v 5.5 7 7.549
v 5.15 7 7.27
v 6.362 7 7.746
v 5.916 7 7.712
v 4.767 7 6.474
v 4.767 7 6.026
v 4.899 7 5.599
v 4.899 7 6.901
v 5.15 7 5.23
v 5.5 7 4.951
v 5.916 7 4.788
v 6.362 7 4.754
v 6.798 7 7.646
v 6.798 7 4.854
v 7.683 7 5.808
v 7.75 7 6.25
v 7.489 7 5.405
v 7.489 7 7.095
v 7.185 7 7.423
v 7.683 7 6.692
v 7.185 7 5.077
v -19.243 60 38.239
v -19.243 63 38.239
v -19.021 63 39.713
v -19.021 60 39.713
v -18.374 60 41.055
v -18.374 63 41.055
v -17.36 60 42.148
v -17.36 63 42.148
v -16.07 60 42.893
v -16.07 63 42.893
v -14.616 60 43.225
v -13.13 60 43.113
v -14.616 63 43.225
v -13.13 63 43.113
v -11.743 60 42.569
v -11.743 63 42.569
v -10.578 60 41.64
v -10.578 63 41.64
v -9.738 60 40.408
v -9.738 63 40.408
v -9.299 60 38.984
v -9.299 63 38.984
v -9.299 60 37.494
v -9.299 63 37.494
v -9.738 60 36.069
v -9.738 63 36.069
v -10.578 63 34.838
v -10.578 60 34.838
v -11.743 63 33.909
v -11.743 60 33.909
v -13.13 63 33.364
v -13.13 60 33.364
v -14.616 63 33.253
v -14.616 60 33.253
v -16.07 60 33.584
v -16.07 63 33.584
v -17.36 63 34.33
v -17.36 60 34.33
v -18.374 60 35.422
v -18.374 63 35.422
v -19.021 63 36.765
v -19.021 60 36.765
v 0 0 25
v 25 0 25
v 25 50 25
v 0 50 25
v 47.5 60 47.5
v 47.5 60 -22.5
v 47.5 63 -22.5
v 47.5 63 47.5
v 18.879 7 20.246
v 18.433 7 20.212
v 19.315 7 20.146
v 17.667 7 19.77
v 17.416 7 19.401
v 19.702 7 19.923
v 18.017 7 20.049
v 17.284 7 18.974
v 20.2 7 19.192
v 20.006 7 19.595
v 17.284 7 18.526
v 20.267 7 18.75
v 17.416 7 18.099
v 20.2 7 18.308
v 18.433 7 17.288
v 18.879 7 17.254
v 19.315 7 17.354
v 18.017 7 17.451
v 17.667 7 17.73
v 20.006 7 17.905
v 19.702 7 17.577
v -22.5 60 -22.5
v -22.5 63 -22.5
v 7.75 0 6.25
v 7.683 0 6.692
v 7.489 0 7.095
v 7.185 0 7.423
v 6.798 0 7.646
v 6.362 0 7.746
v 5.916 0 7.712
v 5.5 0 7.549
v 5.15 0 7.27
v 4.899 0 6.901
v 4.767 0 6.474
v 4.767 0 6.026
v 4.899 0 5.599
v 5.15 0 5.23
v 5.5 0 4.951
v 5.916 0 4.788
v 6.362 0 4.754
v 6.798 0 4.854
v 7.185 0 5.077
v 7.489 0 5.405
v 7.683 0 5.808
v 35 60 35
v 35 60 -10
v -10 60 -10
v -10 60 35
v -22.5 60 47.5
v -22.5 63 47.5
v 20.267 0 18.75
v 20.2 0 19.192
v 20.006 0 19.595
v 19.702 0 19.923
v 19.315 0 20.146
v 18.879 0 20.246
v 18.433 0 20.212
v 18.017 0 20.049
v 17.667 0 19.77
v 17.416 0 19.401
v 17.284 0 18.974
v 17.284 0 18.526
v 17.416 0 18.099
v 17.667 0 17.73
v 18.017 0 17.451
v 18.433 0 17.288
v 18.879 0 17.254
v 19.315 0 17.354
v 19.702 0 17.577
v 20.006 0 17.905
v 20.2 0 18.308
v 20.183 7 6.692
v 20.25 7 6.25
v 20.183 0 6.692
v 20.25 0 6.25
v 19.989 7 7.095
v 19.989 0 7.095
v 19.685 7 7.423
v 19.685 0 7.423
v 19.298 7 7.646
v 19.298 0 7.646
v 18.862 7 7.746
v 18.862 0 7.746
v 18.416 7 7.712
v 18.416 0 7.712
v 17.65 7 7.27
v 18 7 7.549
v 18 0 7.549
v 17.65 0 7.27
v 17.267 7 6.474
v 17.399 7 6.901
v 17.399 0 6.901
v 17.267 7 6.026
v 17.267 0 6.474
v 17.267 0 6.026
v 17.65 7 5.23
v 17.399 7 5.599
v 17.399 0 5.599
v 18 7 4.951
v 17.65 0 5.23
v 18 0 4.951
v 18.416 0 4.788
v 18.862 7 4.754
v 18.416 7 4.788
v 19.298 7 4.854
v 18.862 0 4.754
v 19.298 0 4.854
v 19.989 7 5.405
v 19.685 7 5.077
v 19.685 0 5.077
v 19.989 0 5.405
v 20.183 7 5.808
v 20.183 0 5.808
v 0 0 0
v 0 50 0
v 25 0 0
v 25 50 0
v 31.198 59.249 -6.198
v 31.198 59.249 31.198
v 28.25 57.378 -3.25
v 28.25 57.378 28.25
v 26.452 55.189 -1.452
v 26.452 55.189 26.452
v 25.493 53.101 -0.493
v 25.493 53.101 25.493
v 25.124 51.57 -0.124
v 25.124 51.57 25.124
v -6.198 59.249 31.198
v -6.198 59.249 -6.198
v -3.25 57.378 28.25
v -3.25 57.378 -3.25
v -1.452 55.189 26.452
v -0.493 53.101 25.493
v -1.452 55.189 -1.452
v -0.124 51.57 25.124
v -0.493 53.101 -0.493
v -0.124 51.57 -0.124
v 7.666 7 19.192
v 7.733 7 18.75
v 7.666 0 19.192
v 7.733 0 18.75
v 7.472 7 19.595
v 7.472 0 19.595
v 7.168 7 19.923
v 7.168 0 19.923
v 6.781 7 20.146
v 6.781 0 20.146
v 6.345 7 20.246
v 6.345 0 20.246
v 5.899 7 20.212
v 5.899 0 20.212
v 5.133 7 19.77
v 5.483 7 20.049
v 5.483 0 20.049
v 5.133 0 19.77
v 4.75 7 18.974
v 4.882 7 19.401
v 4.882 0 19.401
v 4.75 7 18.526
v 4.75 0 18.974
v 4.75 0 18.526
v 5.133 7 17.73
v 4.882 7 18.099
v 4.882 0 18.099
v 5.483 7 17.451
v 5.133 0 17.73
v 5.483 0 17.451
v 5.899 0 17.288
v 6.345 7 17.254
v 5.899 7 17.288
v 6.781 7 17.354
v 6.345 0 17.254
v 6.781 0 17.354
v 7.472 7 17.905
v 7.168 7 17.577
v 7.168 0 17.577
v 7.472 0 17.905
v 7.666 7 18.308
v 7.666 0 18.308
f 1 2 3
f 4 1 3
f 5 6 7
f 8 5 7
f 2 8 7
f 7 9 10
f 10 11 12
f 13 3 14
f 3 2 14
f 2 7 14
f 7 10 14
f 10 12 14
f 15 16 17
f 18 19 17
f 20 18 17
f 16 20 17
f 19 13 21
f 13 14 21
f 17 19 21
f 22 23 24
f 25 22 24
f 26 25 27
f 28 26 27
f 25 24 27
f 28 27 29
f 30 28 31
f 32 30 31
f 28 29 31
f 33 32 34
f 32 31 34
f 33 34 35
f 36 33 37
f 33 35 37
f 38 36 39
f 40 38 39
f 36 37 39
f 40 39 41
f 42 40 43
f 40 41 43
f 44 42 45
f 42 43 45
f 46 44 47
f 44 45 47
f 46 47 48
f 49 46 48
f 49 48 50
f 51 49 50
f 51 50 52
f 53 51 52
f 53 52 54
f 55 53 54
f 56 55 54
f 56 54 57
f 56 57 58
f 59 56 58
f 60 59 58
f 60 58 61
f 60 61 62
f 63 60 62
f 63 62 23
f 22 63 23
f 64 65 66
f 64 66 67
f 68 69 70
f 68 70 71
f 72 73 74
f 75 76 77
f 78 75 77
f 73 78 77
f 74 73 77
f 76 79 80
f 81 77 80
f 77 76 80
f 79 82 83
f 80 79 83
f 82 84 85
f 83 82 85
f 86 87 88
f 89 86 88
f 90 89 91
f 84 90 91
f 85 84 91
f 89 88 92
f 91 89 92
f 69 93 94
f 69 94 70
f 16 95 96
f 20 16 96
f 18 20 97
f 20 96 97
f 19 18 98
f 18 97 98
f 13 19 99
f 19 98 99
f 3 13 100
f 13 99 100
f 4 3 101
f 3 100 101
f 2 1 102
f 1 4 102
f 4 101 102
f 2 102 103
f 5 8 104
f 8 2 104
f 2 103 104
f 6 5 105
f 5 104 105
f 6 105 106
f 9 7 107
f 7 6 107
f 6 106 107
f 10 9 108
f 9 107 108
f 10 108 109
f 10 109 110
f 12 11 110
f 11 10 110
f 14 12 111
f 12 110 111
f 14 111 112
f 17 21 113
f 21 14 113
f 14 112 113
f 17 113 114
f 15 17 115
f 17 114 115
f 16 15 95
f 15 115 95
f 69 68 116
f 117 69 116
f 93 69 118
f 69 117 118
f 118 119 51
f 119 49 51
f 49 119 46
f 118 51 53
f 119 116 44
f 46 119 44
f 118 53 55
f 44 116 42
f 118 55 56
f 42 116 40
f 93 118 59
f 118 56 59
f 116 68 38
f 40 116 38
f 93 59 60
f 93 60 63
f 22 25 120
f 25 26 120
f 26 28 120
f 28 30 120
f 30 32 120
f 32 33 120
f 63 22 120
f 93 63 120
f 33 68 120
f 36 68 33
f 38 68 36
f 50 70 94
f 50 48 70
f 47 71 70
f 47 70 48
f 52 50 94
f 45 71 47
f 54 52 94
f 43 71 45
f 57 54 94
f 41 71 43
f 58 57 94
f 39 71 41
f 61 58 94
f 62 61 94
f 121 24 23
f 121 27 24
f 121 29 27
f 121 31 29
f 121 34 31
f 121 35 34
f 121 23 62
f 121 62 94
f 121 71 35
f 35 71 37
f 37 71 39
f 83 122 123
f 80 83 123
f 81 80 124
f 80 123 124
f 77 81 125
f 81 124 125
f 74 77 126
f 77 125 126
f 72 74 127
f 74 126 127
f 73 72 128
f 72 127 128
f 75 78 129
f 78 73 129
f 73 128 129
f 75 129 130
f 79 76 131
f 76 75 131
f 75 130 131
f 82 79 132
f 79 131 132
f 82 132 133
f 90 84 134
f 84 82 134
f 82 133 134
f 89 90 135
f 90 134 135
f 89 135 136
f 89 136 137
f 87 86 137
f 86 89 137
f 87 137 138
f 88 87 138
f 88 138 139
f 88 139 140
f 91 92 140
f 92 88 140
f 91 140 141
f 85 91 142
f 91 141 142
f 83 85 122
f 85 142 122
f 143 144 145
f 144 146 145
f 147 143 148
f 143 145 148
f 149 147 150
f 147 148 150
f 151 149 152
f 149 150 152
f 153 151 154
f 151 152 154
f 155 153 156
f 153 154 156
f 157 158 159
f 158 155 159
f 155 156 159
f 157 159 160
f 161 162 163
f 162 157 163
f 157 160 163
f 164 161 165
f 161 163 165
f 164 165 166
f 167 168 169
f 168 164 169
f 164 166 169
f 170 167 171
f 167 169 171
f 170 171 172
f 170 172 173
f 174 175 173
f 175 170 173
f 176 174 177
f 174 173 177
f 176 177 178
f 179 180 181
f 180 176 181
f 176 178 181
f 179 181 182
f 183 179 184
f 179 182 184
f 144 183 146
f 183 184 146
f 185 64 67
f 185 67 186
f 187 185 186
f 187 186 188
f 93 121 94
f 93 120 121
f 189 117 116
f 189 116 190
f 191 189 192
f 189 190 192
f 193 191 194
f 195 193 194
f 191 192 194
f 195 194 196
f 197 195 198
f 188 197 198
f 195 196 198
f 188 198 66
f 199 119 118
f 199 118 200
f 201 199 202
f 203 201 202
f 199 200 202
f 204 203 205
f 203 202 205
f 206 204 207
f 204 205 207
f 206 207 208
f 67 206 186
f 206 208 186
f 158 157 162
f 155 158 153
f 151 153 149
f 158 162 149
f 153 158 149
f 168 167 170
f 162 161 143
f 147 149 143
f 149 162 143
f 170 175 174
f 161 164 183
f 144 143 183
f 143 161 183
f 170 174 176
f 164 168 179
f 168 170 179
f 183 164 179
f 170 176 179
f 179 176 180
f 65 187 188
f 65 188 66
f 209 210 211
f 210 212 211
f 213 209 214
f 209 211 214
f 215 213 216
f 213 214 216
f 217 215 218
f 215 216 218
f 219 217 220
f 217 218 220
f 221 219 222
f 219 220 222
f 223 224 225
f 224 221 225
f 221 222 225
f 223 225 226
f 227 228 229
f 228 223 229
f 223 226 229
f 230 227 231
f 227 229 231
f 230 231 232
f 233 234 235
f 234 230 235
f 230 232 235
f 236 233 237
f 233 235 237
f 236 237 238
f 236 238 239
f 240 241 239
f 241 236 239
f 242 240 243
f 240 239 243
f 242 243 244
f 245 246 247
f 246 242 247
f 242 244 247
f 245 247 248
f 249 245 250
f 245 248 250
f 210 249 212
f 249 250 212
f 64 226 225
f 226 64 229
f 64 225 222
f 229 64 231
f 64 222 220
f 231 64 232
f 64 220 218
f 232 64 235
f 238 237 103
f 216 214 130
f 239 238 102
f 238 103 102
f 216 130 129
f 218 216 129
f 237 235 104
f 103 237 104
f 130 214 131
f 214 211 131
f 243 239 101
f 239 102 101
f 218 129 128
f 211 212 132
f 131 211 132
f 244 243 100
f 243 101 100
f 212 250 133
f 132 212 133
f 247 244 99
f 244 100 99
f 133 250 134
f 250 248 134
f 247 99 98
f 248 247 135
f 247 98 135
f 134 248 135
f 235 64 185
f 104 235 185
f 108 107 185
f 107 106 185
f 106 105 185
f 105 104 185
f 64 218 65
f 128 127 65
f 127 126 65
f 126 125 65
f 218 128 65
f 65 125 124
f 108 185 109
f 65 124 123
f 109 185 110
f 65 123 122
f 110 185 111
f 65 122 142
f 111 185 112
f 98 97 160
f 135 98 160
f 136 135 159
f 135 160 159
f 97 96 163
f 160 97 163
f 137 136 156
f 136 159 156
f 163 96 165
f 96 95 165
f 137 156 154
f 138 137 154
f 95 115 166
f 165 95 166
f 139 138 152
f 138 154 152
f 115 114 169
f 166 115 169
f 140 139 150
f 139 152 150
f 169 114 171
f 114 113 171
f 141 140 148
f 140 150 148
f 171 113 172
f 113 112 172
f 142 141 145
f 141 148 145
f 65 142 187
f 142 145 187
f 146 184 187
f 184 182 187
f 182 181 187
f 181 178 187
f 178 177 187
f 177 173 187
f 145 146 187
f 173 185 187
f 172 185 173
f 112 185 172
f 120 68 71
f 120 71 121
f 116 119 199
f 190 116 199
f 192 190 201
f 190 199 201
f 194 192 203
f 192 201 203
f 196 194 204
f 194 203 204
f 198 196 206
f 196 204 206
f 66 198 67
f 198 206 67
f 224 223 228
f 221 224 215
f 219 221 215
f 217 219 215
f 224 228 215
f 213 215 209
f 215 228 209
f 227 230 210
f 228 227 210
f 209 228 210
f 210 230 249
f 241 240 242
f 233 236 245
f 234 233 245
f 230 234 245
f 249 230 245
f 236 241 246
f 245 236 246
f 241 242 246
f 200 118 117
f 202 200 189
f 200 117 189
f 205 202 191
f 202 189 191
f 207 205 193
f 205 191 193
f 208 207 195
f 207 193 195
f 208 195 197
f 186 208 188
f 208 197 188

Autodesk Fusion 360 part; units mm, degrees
sketch "Sketch1" plane through (0, 0, 0) normal (0, 1, 0) x (1, 0, 0)
  line L0 (0, 0) -> (25, 0)
  line L1 (25, 0) -> (25, -25)
  line L2 (25, -25) -> (0, -25)
  line L3 (0, -25) -> (0, 0)
  dimension "d1" = 25
  dimension "d2" = 25
extrude "Extrude1" add sketch "Sketch1" along normal blind 60
sketch "Sketch2" plane through (0, 60, 0) normal (0, 1, 0) x (-1, 0, 0)
  line L0 (0, 25) -> (-25, 25)
  line L1 (-25, 25) -> (-25, 0)
  line L2 (-25, 0) -> (0, 0)
  line L3 (0, 0) -> (0, 25)
  line L4 (-47.5, 47.5) -> (22.5, 47.5)
  line L5 (22.5, 47.5) -> (22.5, -22.5)
  line L6 (22.5, -22.5) -> (-47.5, -22.5)
  line L7 (-47.5, -22.5) -> (-47.5, 47.5)
  line L8 (-47.5, 47.5) -> (22.5, -22.5) construction
  line L9 (22.5, 47.5) -> (-47.5, -22.5) construction
  point P0 (-12.5, 12.5)
  dimension "d5" = 70
  dimension "d6" = 70
extrude "Extrude2" add sketch "Sketch2" along normal blind 3 contours L0 L1 L2 L3 | L4 L5 L6 L7
fillet "Fillet1" radius 10 4 edges at (12.5, 60, 25) (25, 60, 12.5) (0, 60, 12.5) (12.5, 60, 0)
sketch "Sketch3" plane through (0, 63, 0) normal (0, 1, 0) x (-1, 0, 0)
  line L0 (-47.5, -22.5) -> (22.5, -22.5)
  line L1 (22.5, -22.5) -> (22.5, 47.5)
  line L2 (22.5, 47.5) -> (-47.5, 47.5)
  line L3 (-47.5, 47.5) -> (-47.5, -22.5)
  circle A0 centre (14.2428, 38.2388) radius 5
  dimension "d11" = 10
extrude "Extrude3" cut sketch "Sketch3" against normal blind 30 contours A0
sketch "Sketch4" plane through (0, 0, 0) normal (0, 1, 0) x (1, 0, 0)
  line L0 (25, 0) -> (0, 0)
  line L1 (0, 0) -> (0, -25)
  line L2 (0, -25) -> (25, -25)
  line L3 (25, -25) -> (25, 0)
  circle A0 centre (18.75, -6.25) radius 1.5
  circle A1 centre (18.767, -18.75) radius 1.5
  circle A2 centre (6.25, -6.25) radius 1.5
  circle A3 centre (6.233, -18.75) radius 1.5
  point P0 (25, 0)
  point P1 (25, -25)
  dimension "d14" = 3
  dimension "d15" = 3
  dimension "d17" = 12.5
  dimension "d18" = 6.25
extrude "Extrude4" cut sketch "Sketch4" along normal blind 7 contours A0 | A1 | A2 | A3
equation "d17 = 2.5 / 2 * 1 cm"
equation "d18 = 2.5 / 4 * 1 cm"
